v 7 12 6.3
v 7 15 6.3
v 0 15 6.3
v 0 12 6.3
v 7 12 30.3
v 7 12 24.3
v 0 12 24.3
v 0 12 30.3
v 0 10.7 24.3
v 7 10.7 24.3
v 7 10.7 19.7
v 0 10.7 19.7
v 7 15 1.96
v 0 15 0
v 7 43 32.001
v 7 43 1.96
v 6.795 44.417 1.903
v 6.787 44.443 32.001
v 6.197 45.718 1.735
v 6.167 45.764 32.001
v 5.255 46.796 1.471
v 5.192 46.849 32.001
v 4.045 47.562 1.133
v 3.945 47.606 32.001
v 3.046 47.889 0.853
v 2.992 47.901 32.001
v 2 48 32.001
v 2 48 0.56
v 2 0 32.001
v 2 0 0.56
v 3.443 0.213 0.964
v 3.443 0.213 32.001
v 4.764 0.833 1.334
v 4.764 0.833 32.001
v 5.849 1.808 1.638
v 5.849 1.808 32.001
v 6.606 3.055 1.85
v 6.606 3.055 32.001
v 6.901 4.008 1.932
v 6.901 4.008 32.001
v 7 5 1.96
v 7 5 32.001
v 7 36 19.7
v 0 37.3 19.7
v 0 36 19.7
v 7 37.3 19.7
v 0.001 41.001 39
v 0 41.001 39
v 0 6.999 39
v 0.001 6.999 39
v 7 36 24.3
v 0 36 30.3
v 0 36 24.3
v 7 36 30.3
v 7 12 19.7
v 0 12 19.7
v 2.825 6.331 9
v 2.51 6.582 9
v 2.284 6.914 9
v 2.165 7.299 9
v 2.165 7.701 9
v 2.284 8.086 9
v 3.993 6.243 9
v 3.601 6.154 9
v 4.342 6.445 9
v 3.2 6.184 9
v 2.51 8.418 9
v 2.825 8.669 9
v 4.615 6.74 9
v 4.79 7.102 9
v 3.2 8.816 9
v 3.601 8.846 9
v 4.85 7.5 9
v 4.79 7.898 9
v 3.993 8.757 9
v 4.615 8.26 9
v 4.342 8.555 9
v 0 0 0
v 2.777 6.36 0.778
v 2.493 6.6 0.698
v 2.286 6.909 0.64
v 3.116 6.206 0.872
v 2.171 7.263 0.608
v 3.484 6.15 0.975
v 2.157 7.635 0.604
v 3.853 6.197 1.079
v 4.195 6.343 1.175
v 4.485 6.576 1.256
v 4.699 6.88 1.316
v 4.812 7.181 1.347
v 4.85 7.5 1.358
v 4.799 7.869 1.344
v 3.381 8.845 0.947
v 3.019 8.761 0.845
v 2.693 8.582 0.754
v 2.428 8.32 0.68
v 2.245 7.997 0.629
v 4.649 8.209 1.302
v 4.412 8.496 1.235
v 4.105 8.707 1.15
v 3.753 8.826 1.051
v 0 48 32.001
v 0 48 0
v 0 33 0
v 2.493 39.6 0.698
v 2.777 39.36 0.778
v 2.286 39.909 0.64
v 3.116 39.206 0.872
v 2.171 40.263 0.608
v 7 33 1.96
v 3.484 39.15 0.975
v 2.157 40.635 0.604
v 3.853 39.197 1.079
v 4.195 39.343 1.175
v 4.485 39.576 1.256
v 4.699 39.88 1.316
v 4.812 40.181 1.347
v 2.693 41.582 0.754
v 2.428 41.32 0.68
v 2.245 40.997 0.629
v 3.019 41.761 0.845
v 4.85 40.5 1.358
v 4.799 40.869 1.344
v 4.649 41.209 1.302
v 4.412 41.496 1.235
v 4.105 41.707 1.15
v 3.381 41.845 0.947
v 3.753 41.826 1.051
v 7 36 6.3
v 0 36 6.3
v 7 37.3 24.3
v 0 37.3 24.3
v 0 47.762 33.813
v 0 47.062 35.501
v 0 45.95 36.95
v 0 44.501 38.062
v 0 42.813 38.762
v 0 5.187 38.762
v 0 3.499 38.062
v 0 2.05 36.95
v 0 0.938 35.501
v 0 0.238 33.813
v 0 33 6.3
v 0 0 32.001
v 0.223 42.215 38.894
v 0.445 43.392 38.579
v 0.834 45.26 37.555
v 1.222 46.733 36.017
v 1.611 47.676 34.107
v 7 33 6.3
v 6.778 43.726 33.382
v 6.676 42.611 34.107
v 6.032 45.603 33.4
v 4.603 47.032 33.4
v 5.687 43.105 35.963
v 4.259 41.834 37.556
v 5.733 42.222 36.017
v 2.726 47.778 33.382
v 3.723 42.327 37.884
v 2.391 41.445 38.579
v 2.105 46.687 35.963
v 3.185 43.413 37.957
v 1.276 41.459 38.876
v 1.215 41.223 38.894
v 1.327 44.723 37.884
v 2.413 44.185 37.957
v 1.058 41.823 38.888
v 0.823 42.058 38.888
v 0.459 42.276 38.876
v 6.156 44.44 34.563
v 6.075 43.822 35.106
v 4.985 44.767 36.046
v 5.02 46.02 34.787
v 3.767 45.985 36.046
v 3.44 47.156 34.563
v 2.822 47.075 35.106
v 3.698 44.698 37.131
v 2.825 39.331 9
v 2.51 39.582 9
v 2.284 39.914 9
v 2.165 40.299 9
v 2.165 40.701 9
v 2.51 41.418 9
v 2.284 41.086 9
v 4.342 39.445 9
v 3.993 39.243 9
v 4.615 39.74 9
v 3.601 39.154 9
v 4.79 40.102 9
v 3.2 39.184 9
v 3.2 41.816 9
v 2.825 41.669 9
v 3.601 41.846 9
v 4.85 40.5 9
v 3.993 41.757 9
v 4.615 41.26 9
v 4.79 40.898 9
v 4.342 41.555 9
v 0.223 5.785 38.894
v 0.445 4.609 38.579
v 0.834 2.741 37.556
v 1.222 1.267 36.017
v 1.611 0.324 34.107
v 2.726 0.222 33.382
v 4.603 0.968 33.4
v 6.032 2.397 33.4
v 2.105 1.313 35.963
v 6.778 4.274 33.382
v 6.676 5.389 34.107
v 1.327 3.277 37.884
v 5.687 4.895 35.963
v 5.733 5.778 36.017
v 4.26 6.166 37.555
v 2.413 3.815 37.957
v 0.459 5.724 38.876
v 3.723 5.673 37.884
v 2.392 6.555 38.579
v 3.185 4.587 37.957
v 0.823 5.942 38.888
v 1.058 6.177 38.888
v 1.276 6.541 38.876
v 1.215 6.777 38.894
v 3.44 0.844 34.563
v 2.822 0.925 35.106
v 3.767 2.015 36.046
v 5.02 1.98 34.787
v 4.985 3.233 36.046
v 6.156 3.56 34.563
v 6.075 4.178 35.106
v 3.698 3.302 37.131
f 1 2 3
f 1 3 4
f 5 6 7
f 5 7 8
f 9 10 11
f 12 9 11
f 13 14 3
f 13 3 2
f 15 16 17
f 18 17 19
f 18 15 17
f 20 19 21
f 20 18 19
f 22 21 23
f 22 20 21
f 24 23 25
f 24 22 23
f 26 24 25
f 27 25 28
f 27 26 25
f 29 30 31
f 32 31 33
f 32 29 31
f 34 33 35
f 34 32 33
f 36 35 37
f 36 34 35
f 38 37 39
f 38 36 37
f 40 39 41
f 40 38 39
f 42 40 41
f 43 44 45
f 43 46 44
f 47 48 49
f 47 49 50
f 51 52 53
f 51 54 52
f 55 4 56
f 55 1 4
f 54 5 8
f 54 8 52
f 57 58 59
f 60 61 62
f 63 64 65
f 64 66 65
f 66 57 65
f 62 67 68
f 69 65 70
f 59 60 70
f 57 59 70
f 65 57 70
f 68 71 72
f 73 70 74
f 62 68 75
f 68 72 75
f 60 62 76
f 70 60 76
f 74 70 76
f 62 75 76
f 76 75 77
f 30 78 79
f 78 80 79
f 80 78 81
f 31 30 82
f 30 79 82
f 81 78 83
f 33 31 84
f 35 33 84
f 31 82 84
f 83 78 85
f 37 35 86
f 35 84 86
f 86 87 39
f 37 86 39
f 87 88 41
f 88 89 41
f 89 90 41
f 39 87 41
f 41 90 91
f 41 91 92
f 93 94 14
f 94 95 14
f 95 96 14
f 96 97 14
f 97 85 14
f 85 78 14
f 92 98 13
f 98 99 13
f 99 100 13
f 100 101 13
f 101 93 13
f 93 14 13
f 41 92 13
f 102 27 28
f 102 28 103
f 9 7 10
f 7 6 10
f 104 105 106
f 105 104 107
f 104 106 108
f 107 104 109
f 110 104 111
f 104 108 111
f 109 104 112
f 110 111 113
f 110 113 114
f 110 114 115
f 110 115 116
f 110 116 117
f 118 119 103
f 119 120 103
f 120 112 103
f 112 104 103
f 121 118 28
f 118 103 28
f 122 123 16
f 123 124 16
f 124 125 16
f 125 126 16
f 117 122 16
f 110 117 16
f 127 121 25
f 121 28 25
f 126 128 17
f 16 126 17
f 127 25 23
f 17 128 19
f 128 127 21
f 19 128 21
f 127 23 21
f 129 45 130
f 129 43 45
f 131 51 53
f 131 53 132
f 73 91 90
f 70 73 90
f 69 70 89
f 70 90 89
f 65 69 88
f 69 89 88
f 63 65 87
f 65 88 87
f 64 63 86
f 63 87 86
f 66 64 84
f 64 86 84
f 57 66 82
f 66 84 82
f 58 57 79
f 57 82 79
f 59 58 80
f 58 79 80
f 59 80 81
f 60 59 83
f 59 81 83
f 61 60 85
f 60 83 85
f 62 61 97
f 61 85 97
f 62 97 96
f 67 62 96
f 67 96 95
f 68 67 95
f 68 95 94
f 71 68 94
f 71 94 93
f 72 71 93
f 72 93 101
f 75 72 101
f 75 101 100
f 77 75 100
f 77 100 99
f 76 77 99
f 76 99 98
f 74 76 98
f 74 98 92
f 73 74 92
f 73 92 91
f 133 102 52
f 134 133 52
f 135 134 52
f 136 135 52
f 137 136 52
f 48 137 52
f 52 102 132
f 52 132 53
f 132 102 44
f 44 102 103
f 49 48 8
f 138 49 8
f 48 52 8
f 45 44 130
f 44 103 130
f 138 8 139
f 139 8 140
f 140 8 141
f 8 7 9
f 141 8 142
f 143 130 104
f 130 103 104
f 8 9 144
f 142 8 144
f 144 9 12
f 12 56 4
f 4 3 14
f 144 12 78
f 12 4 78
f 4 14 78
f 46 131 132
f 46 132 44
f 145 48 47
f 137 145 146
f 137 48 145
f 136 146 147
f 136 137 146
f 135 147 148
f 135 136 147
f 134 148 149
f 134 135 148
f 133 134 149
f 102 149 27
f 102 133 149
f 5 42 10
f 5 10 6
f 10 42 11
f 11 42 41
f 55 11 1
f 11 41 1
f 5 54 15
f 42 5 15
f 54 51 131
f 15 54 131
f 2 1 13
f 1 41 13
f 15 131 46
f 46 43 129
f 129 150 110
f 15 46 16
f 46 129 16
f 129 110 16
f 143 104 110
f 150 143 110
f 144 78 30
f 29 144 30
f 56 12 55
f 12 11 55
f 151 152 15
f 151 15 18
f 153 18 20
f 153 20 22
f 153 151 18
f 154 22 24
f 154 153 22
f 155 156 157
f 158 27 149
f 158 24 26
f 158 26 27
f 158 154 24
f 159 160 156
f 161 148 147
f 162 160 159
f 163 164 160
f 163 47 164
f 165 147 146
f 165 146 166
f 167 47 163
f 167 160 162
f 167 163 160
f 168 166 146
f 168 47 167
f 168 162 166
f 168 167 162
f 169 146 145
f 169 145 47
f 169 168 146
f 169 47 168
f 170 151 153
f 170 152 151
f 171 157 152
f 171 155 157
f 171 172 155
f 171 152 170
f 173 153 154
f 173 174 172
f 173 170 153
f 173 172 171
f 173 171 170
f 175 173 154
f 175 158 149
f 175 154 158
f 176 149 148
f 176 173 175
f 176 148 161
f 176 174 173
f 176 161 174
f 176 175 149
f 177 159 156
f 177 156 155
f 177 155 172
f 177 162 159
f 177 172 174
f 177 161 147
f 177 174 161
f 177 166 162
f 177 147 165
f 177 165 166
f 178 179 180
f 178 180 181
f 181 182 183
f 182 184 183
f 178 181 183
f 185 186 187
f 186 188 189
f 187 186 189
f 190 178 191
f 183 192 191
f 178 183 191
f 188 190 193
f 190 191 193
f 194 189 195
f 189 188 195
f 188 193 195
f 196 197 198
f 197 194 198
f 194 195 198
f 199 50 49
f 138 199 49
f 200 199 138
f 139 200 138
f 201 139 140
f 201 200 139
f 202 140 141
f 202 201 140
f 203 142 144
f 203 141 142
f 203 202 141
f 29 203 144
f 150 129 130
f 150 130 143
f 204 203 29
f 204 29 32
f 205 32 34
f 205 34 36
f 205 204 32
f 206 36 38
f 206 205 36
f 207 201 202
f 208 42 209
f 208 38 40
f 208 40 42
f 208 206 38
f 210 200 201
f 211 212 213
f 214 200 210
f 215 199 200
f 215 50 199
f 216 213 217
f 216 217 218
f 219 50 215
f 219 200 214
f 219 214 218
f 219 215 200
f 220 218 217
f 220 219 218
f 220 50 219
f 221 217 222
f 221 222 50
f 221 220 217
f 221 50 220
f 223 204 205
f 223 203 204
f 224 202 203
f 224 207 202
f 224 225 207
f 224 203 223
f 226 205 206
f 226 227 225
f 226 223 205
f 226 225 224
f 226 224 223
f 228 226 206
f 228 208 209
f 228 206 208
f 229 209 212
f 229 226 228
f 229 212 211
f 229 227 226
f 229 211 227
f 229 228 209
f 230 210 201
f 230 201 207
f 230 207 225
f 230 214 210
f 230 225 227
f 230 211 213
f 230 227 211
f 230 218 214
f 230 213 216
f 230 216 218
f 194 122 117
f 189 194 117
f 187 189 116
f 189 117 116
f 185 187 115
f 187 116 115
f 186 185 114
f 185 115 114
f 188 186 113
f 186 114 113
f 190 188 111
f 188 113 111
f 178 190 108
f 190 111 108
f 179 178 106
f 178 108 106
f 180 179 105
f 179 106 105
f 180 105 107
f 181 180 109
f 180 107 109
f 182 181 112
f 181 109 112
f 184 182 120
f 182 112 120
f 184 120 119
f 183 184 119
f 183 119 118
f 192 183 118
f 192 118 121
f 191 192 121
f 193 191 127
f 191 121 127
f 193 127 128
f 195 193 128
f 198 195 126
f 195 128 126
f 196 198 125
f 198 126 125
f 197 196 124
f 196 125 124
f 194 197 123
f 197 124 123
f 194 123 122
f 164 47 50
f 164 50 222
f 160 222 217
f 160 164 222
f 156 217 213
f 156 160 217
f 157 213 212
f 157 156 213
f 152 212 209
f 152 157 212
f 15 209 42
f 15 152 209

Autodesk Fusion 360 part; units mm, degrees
sketch "Sketch1" plane through (0, 0, 0) normal (0, 0, 1) x (1, 0, 0)
  line L0 (0, 0) -> (7, 0)
  line L1 (7, 0) -> (7, 48)
  line L2 (7, 48) -> (0, 48)
  line L3 (0, 48) -> (0, 0)
  circle A0 centre (3.5, 40.5) radius 1.35
  circle A1 centre (3.5, 7.5) radius 1.35
  line L4 (0, 33) -> (7, 33)
  line L5 (0, 15) -> (7, 15)
  dimension "d1" = 7
  dimension "d2" = 48
  dimension "d3" = 2.7
  dimension "d4" = 2.7
  dimension "d5" = 3.5
  dimension "d6" = 3.5
  dimension "d7" = 33
  dimension "d8" = 7.5
  dimension "d9" = 15
  dimension "d10" = 15
extrude "Extrude1" add sketch "Sketch1" along normal blind 13 contours L0 L1 L3 L5 | L1 L2 L3 L4 makes body 1 at (0, 10, 4.3333) makes body 2 at (0, 43, 4.3333)
extrude "Extrude2" add sketch "Sketch1" along normal blind 30 from surface at 9 contours L0 L1 L3 L5 | L1 L3 L4 L5 | L1 L2 L3 L4 | A0 | A1 bodies 1 2
sketch "Sketch2" plane through (7, 0, 0) normal (1, 0, 0) x (0, 1, 0)
  line L0 (33, 0) -> (48, 0)
  line L1 (48, 0) -> (48, 39)
  line L2 (48, 39) -> (0, 39)
  line L3 (0, 39) -> (0, 0)
  line L4 (0, 0) -> (15, 0)
  line L5 (15, 0) -> (15, 9)
  line L6 (15, 9) -> (33, 9)
  line L7 (33, 9) -> (33, 0)
  line L8 (12, 30.3) -> (36, 30.3)
  line L9 (36, 30.3) -> (36, 6.3)
  line L10 (36, 6.3) -> (12, 6.3)
  line L11 (12, 6.3) -> (12, 30.3)
  line L12 (0, 0) -> (48, 0)
  line L13 (12, 24.3) -> (10.7, 24.3)
  line L14 (10.7, 24.3) -> (10.7, 19.7)
  line L15 (10.7, 19.7) -> (12, 19.7)
  line L16 (12, 19.7) -> (12, 24.3)
  line L17 (36, 24.3) -> (37.3, 24.3)
  line L18 (37.3, 24.3) -> (37.3, 19.7)
  line L19 (37.3, 19.7) -> (36, 19.7)
  line L20 (36, 19.7) -> (36, 24.3)
  dimension "d18" = 24
  dimension "d19" = 24
  dimension "d20" = 12
  dimension "d22" = 6.3
  dimension "d31" = 6
  dimension "d32" = 6
  dimension "d33" = 4.6
  dimension "d34" = 4.6
  dimension "d35" = 1.3
  dimension "d36" = 1.3
extrude "Extrude3" cut sketch "Sketch2" against normal blind 7 contours L5 L6 L7 L10 | L5 L6 L7 L8 L9 L10 L11 L16 L20 | L9 L17 L18 L19 L20 | L11 L13 L14 L15 L16 bodies 1
fillet "Fillet3" radius 5 2 edges at (7, 48, 19.5) (7, 0, 19.5) on bodies 1
sketch "Sketch3" plane through (0, 48, 0) normal (0, 1, 0) x (-1, 0, 0)
  line L0 (-2, 39) -> (-2, 0)
  line L1 (-2, 0) -> (0, 0)
  line L2 (0, 0) -> (0, 39)
  line L3 (0, 0) -> (-7.1424, 2)
  line L4 (-7.1424, 2) -> (-7.1424, 0)
  line L5 (-7.1424, 0) -> (0, 0)
  line L6 (0, 39) -> (-2, 39)
  dimension "d39" = 2
fillet "Fillet4" radius 7 5 edges at (1, 0, 39) (5.5355, 1.4645, 39) (7, 24, 39) (5.5355, 46.5355, 39) (1, 48, 39) on bodies 1
extrude "Extrude4" cut sketch "Sketch3" against normal blind 50 contours L0 L1 L3 L5 | L0 L3 L4 L5 bodies 1
fillet "Fillet2" [suppressed]
equation "d14 = 28.00 mm + 2 mm"
